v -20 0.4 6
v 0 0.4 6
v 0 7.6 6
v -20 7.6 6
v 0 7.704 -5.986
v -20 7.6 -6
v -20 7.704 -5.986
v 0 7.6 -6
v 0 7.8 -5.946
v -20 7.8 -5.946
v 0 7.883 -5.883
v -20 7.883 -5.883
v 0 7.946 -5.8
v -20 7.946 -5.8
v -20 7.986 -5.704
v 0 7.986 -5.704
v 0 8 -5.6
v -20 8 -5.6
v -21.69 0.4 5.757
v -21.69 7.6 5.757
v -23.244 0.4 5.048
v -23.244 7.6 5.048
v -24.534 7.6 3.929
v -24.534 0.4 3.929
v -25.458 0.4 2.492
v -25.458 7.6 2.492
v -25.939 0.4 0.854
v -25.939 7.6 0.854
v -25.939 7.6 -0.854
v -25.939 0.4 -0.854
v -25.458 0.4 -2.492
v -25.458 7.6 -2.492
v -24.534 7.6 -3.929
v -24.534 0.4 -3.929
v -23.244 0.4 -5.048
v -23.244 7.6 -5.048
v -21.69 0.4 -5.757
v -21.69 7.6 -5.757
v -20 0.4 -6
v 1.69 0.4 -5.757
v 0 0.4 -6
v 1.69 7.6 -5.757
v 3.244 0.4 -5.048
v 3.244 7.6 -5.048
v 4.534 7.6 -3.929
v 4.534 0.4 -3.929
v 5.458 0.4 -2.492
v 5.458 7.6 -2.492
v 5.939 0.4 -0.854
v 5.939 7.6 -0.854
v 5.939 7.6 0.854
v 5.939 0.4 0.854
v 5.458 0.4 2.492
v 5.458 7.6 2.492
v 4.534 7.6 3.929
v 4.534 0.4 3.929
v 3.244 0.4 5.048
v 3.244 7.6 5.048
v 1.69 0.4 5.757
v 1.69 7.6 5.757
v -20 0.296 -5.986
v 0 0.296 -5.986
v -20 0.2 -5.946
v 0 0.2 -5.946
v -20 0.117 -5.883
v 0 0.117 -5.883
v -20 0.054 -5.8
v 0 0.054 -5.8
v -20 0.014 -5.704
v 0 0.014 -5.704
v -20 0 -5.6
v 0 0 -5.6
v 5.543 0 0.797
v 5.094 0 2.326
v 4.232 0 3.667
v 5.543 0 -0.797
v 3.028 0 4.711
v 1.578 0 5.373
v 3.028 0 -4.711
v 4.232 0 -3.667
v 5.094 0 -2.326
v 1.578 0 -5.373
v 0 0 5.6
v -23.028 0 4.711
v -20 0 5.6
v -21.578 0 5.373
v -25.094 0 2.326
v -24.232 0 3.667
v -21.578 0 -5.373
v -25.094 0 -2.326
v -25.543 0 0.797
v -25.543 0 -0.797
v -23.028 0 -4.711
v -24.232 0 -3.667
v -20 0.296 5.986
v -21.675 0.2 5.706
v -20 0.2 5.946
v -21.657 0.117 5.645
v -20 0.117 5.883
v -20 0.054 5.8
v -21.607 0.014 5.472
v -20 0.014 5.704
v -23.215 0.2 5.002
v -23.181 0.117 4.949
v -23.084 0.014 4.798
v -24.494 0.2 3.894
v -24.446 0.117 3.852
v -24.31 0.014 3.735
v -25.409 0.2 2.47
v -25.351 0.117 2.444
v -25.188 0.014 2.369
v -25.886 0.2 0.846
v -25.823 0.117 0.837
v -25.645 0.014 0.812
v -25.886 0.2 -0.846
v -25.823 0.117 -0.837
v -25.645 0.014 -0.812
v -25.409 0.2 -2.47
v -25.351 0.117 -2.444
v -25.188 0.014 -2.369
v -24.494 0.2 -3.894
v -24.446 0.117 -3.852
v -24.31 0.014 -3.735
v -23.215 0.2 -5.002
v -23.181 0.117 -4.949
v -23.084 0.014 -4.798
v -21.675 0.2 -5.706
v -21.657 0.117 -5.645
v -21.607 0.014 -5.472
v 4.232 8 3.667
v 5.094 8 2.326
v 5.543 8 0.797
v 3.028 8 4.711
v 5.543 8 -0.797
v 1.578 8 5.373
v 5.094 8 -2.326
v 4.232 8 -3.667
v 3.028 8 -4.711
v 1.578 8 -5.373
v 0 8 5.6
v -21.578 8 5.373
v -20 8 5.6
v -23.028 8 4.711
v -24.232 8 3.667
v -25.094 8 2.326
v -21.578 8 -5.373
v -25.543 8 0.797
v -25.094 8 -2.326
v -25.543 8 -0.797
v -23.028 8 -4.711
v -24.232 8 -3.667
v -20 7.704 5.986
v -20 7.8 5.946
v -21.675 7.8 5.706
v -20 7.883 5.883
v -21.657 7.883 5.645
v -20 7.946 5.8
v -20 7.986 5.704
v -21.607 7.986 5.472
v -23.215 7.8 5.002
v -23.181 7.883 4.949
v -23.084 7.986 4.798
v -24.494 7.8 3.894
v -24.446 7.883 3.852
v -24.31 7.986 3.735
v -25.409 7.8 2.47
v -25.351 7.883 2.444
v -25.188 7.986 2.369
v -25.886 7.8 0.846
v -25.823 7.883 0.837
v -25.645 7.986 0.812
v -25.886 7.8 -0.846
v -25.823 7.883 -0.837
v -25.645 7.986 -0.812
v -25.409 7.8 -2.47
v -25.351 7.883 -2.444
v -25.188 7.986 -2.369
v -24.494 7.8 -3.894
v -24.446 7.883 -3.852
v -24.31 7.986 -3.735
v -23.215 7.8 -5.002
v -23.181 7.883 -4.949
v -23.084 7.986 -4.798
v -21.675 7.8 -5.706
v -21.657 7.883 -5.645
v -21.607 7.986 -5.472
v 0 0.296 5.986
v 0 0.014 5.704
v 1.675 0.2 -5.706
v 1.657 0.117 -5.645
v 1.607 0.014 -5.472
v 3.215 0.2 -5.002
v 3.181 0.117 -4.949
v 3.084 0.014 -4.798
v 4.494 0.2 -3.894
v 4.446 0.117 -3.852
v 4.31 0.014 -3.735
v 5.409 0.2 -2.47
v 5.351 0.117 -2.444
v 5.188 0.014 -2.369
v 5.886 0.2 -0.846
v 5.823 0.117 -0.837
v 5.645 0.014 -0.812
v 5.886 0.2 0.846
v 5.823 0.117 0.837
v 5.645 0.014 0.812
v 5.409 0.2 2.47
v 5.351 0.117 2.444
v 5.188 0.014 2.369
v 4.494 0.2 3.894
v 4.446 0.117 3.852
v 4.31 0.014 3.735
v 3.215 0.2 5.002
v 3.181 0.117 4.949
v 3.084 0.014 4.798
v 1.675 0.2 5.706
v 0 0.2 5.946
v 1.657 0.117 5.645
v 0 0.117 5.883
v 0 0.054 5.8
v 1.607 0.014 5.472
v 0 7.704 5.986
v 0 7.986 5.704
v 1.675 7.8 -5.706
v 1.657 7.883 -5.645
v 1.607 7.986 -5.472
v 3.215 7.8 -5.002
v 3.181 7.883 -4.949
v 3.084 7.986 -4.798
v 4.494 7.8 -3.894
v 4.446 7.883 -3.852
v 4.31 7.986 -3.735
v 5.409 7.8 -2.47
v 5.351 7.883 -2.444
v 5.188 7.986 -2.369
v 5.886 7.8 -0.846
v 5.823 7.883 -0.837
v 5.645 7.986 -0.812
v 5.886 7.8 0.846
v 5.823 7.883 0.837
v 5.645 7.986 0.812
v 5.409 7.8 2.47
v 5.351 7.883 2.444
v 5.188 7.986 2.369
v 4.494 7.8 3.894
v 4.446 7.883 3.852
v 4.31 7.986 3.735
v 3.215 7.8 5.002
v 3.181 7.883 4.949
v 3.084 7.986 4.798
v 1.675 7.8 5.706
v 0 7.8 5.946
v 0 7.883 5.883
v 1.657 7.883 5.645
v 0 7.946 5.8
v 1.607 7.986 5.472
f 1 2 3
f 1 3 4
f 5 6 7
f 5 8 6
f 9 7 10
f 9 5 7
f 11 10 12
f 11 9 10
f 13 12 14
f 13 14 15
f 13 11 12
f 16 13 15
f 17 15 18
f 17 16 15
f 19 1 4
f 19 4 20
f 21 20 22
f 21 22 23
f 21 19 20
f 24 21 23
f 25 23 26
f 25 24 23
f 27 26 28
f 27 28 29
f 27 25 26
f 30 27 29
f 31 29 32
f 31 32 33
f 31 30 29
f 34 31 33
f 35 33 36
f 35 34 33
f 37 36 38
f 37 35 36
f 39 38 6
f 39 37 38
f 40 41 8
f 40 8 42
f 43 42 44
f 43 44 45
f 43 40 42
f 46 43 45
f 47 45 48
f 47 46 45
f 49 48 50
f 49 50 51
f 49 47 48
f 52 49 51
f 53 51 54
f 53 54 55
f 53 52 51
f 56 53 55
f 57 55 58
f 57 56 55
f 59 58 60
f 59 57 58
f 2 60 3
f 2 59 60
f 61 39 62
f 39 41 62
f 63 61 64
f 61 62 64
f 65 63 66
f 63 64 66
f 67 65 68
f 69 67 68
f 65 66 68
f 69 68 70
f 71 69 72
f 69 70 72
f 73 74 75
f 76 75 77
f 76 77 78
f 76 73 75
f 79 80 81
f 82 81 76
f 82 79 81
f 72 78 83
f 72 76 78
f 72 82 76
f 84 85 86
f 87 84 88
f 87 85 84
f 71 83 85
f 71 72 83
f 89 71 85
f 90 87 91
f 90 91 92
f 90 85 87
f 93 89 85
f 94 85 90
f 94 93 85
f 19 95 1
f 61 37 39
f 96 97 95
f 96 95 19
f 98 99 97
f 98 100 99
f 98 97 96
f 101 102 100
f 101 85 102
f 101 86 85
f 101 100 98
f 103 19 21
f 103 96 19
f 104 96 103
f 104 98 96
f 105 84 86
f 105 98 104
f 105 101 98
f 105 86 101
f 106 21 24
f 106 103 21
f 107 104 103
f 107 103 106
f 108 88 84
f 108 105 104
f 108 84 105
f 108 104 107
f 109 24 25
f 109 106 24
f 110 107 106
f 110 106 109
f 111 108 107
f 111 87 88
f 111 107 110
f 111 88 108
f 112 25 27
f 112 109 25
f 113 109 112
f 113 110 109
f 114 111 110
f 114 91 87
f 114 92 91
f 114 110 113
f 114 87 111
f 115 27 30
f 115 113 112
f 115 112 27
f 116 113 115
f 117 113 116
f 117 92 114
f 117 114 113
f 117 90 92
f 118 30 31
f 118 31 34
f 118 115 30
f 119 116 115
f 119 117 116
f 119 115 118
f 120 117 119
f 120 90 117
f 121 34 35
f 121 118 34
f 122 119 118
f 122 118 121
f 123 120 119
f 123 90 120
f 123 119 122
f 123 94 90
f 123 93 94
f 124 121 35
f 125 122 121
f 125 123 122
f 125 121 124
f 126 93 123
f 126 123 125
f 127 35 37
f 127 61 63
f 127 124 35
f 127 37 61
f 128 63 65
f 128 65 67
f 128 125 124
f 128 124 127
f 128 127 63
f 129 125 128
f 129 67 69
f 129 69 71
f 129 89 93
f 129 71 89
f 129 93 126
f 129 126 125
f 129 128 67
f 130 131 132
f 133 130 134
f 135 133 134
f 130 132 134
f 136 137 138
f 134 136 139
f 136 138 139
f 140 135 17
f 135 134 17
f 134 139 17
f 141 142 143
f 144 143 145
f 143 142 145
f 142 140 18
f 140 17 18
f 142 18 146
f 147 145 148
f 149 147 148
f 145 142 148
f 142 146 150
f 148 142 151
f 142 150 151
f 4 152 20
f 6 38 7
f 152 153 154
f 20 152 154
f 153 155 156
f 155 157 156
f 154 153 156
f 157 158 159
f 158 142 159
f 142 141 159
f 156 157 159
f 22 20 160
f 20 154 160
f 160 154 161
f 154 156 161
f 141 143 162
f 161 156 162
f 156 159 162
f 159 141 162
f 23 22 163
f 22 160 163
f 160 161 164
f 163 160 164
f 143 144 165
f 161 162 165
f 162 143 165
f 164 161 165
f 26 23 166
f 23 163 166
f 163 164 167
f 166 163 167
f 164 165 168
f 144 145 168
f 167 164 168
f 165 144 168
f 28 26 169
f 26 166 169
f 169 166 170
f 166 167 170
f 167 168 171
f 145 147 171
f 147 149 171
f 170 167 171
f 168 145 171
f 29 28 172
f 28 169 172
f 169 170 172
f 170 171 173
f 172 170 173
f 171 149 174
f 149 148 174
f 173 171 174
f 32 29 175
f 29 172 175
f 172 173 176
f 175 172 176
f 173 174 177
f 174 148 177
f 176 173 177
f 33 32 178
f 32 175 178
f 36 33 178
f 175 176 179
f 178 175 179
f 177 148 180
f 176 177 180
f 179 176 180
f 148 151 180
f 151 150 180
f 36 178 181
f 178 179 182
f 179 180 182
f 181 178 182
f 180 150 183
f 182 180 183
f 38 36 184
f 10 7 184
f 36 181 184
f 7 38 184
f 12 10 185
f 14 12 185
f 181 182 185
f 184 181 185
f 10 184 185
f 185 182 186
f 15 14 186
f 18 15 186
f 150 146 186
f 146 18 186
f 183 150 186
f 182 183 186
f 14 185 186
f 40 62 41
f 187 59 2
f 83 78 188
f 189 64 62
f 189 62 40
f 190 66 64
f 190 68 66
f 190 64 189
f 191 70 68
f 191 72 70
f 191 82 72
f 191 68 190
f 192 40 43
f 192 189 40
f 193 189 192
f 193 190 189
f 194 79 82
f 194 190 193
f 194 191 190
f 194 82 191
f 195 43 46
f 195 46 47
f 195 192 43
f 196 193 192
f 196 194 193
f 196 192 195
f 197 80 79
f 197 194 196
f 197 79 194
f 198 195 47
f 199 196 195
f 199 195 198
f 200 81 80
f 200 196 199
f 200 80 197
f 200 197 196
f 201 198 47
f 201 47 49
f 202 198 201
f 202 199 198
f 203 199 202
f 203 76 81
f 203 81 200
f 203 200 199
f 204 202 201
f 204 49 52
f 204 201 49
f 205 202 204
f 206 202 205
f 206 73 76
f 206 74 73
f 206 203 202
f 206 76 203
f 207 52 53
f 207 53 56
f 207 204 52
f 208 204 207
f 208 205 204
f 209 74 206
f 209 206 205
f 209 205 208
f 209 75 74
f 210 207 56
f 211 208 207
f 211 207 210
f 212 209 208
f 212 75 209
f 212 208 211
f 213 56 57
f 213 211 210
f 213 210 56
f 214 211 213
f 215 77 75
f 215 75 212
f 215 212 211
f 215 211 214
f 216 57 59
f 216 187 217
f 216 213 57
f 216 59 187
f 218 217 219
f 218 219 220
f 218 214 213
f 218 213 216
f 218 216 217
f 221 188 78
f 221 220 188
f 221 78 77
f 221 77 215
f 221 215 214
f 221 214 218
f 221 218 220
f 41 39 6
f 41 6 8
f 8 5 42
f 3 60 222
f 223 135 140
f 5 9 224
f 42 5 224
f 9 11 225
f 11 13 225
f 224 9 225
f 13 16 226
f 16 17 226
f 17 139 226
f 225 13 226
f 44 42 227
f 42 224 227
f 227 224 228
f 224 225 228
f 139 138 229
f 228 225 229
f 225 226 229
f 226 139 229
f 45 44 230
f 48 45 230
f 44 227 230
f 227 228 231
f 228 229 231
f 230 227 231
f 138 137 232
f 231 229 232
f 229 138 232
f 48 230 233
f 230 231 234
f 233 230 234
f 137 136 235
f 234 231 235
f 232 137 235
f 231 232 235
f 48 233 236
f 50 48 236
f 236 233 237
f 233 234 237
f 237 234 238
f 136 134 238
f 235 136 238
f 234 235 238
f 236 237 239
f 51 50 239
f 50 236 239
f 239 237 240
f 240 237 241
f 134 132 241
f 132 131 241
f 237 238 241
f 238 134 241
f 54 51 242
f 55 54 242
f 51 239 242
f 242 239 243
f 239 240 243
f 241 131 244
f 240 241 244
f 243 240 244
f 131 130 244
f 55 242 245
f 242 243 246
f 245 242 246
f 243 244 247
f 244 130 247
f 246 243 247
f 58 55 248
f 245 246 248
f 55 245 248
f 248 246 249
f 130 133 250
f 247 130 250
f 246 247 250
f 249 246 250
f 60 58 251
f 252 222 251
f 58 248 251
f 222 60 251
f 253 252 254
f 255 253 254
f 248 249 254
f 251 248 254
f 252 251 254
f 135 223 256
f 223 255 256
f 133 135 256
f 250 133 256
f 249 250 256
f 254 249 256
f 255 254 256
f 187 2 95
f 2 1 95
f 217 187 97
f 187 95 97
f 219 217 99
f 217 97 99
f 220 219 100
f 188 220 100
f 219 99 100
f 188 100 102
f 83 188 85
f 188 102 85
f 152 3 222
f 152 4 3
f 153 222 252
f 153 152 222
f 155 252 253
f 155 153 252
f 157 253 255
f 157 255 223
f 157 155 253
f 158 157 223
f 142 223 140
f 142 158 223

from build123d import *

# Parameters (mm, degrees)
EXTRUDE1_DEPTH = 8
FILLET1_R      = 0.4


with BuildPart() as part:
    # Sketch1 → Extrude1 (new body)
    with BuildSketch(Plane(origin=(0, 0, 0), x_dir=(1, 0, 0), z_dir=(0, 1, 0))):
        with BuildLine():
            Line((-20, 6), (0, 6))
            ThreePointArc((0, 6), (6, 0), (0, -6))
            Line((0, -6), (-20, -6))
            ThreePointArc((-20, -6), (-26, 0), (-20, 6))
        make_face()
    extrude(amount=EXTRUDE1_DEPTH)

    # Fillet1
    fillet1_edges = [part.edges().sort_by_distance(p)[0] for p in [
        (6, 8, 0),
        (-10, 8, -6),
        (-26, 8, 0),
        (-10, 0, -6),
        (6, 0, 0),
        (-10, 0, 6),
        (-26, 0, 0),
        (-10, 8, 6),
    ]]
    fillet(fillet1_edges, radius=FILLET1_R)


solid = part.part
